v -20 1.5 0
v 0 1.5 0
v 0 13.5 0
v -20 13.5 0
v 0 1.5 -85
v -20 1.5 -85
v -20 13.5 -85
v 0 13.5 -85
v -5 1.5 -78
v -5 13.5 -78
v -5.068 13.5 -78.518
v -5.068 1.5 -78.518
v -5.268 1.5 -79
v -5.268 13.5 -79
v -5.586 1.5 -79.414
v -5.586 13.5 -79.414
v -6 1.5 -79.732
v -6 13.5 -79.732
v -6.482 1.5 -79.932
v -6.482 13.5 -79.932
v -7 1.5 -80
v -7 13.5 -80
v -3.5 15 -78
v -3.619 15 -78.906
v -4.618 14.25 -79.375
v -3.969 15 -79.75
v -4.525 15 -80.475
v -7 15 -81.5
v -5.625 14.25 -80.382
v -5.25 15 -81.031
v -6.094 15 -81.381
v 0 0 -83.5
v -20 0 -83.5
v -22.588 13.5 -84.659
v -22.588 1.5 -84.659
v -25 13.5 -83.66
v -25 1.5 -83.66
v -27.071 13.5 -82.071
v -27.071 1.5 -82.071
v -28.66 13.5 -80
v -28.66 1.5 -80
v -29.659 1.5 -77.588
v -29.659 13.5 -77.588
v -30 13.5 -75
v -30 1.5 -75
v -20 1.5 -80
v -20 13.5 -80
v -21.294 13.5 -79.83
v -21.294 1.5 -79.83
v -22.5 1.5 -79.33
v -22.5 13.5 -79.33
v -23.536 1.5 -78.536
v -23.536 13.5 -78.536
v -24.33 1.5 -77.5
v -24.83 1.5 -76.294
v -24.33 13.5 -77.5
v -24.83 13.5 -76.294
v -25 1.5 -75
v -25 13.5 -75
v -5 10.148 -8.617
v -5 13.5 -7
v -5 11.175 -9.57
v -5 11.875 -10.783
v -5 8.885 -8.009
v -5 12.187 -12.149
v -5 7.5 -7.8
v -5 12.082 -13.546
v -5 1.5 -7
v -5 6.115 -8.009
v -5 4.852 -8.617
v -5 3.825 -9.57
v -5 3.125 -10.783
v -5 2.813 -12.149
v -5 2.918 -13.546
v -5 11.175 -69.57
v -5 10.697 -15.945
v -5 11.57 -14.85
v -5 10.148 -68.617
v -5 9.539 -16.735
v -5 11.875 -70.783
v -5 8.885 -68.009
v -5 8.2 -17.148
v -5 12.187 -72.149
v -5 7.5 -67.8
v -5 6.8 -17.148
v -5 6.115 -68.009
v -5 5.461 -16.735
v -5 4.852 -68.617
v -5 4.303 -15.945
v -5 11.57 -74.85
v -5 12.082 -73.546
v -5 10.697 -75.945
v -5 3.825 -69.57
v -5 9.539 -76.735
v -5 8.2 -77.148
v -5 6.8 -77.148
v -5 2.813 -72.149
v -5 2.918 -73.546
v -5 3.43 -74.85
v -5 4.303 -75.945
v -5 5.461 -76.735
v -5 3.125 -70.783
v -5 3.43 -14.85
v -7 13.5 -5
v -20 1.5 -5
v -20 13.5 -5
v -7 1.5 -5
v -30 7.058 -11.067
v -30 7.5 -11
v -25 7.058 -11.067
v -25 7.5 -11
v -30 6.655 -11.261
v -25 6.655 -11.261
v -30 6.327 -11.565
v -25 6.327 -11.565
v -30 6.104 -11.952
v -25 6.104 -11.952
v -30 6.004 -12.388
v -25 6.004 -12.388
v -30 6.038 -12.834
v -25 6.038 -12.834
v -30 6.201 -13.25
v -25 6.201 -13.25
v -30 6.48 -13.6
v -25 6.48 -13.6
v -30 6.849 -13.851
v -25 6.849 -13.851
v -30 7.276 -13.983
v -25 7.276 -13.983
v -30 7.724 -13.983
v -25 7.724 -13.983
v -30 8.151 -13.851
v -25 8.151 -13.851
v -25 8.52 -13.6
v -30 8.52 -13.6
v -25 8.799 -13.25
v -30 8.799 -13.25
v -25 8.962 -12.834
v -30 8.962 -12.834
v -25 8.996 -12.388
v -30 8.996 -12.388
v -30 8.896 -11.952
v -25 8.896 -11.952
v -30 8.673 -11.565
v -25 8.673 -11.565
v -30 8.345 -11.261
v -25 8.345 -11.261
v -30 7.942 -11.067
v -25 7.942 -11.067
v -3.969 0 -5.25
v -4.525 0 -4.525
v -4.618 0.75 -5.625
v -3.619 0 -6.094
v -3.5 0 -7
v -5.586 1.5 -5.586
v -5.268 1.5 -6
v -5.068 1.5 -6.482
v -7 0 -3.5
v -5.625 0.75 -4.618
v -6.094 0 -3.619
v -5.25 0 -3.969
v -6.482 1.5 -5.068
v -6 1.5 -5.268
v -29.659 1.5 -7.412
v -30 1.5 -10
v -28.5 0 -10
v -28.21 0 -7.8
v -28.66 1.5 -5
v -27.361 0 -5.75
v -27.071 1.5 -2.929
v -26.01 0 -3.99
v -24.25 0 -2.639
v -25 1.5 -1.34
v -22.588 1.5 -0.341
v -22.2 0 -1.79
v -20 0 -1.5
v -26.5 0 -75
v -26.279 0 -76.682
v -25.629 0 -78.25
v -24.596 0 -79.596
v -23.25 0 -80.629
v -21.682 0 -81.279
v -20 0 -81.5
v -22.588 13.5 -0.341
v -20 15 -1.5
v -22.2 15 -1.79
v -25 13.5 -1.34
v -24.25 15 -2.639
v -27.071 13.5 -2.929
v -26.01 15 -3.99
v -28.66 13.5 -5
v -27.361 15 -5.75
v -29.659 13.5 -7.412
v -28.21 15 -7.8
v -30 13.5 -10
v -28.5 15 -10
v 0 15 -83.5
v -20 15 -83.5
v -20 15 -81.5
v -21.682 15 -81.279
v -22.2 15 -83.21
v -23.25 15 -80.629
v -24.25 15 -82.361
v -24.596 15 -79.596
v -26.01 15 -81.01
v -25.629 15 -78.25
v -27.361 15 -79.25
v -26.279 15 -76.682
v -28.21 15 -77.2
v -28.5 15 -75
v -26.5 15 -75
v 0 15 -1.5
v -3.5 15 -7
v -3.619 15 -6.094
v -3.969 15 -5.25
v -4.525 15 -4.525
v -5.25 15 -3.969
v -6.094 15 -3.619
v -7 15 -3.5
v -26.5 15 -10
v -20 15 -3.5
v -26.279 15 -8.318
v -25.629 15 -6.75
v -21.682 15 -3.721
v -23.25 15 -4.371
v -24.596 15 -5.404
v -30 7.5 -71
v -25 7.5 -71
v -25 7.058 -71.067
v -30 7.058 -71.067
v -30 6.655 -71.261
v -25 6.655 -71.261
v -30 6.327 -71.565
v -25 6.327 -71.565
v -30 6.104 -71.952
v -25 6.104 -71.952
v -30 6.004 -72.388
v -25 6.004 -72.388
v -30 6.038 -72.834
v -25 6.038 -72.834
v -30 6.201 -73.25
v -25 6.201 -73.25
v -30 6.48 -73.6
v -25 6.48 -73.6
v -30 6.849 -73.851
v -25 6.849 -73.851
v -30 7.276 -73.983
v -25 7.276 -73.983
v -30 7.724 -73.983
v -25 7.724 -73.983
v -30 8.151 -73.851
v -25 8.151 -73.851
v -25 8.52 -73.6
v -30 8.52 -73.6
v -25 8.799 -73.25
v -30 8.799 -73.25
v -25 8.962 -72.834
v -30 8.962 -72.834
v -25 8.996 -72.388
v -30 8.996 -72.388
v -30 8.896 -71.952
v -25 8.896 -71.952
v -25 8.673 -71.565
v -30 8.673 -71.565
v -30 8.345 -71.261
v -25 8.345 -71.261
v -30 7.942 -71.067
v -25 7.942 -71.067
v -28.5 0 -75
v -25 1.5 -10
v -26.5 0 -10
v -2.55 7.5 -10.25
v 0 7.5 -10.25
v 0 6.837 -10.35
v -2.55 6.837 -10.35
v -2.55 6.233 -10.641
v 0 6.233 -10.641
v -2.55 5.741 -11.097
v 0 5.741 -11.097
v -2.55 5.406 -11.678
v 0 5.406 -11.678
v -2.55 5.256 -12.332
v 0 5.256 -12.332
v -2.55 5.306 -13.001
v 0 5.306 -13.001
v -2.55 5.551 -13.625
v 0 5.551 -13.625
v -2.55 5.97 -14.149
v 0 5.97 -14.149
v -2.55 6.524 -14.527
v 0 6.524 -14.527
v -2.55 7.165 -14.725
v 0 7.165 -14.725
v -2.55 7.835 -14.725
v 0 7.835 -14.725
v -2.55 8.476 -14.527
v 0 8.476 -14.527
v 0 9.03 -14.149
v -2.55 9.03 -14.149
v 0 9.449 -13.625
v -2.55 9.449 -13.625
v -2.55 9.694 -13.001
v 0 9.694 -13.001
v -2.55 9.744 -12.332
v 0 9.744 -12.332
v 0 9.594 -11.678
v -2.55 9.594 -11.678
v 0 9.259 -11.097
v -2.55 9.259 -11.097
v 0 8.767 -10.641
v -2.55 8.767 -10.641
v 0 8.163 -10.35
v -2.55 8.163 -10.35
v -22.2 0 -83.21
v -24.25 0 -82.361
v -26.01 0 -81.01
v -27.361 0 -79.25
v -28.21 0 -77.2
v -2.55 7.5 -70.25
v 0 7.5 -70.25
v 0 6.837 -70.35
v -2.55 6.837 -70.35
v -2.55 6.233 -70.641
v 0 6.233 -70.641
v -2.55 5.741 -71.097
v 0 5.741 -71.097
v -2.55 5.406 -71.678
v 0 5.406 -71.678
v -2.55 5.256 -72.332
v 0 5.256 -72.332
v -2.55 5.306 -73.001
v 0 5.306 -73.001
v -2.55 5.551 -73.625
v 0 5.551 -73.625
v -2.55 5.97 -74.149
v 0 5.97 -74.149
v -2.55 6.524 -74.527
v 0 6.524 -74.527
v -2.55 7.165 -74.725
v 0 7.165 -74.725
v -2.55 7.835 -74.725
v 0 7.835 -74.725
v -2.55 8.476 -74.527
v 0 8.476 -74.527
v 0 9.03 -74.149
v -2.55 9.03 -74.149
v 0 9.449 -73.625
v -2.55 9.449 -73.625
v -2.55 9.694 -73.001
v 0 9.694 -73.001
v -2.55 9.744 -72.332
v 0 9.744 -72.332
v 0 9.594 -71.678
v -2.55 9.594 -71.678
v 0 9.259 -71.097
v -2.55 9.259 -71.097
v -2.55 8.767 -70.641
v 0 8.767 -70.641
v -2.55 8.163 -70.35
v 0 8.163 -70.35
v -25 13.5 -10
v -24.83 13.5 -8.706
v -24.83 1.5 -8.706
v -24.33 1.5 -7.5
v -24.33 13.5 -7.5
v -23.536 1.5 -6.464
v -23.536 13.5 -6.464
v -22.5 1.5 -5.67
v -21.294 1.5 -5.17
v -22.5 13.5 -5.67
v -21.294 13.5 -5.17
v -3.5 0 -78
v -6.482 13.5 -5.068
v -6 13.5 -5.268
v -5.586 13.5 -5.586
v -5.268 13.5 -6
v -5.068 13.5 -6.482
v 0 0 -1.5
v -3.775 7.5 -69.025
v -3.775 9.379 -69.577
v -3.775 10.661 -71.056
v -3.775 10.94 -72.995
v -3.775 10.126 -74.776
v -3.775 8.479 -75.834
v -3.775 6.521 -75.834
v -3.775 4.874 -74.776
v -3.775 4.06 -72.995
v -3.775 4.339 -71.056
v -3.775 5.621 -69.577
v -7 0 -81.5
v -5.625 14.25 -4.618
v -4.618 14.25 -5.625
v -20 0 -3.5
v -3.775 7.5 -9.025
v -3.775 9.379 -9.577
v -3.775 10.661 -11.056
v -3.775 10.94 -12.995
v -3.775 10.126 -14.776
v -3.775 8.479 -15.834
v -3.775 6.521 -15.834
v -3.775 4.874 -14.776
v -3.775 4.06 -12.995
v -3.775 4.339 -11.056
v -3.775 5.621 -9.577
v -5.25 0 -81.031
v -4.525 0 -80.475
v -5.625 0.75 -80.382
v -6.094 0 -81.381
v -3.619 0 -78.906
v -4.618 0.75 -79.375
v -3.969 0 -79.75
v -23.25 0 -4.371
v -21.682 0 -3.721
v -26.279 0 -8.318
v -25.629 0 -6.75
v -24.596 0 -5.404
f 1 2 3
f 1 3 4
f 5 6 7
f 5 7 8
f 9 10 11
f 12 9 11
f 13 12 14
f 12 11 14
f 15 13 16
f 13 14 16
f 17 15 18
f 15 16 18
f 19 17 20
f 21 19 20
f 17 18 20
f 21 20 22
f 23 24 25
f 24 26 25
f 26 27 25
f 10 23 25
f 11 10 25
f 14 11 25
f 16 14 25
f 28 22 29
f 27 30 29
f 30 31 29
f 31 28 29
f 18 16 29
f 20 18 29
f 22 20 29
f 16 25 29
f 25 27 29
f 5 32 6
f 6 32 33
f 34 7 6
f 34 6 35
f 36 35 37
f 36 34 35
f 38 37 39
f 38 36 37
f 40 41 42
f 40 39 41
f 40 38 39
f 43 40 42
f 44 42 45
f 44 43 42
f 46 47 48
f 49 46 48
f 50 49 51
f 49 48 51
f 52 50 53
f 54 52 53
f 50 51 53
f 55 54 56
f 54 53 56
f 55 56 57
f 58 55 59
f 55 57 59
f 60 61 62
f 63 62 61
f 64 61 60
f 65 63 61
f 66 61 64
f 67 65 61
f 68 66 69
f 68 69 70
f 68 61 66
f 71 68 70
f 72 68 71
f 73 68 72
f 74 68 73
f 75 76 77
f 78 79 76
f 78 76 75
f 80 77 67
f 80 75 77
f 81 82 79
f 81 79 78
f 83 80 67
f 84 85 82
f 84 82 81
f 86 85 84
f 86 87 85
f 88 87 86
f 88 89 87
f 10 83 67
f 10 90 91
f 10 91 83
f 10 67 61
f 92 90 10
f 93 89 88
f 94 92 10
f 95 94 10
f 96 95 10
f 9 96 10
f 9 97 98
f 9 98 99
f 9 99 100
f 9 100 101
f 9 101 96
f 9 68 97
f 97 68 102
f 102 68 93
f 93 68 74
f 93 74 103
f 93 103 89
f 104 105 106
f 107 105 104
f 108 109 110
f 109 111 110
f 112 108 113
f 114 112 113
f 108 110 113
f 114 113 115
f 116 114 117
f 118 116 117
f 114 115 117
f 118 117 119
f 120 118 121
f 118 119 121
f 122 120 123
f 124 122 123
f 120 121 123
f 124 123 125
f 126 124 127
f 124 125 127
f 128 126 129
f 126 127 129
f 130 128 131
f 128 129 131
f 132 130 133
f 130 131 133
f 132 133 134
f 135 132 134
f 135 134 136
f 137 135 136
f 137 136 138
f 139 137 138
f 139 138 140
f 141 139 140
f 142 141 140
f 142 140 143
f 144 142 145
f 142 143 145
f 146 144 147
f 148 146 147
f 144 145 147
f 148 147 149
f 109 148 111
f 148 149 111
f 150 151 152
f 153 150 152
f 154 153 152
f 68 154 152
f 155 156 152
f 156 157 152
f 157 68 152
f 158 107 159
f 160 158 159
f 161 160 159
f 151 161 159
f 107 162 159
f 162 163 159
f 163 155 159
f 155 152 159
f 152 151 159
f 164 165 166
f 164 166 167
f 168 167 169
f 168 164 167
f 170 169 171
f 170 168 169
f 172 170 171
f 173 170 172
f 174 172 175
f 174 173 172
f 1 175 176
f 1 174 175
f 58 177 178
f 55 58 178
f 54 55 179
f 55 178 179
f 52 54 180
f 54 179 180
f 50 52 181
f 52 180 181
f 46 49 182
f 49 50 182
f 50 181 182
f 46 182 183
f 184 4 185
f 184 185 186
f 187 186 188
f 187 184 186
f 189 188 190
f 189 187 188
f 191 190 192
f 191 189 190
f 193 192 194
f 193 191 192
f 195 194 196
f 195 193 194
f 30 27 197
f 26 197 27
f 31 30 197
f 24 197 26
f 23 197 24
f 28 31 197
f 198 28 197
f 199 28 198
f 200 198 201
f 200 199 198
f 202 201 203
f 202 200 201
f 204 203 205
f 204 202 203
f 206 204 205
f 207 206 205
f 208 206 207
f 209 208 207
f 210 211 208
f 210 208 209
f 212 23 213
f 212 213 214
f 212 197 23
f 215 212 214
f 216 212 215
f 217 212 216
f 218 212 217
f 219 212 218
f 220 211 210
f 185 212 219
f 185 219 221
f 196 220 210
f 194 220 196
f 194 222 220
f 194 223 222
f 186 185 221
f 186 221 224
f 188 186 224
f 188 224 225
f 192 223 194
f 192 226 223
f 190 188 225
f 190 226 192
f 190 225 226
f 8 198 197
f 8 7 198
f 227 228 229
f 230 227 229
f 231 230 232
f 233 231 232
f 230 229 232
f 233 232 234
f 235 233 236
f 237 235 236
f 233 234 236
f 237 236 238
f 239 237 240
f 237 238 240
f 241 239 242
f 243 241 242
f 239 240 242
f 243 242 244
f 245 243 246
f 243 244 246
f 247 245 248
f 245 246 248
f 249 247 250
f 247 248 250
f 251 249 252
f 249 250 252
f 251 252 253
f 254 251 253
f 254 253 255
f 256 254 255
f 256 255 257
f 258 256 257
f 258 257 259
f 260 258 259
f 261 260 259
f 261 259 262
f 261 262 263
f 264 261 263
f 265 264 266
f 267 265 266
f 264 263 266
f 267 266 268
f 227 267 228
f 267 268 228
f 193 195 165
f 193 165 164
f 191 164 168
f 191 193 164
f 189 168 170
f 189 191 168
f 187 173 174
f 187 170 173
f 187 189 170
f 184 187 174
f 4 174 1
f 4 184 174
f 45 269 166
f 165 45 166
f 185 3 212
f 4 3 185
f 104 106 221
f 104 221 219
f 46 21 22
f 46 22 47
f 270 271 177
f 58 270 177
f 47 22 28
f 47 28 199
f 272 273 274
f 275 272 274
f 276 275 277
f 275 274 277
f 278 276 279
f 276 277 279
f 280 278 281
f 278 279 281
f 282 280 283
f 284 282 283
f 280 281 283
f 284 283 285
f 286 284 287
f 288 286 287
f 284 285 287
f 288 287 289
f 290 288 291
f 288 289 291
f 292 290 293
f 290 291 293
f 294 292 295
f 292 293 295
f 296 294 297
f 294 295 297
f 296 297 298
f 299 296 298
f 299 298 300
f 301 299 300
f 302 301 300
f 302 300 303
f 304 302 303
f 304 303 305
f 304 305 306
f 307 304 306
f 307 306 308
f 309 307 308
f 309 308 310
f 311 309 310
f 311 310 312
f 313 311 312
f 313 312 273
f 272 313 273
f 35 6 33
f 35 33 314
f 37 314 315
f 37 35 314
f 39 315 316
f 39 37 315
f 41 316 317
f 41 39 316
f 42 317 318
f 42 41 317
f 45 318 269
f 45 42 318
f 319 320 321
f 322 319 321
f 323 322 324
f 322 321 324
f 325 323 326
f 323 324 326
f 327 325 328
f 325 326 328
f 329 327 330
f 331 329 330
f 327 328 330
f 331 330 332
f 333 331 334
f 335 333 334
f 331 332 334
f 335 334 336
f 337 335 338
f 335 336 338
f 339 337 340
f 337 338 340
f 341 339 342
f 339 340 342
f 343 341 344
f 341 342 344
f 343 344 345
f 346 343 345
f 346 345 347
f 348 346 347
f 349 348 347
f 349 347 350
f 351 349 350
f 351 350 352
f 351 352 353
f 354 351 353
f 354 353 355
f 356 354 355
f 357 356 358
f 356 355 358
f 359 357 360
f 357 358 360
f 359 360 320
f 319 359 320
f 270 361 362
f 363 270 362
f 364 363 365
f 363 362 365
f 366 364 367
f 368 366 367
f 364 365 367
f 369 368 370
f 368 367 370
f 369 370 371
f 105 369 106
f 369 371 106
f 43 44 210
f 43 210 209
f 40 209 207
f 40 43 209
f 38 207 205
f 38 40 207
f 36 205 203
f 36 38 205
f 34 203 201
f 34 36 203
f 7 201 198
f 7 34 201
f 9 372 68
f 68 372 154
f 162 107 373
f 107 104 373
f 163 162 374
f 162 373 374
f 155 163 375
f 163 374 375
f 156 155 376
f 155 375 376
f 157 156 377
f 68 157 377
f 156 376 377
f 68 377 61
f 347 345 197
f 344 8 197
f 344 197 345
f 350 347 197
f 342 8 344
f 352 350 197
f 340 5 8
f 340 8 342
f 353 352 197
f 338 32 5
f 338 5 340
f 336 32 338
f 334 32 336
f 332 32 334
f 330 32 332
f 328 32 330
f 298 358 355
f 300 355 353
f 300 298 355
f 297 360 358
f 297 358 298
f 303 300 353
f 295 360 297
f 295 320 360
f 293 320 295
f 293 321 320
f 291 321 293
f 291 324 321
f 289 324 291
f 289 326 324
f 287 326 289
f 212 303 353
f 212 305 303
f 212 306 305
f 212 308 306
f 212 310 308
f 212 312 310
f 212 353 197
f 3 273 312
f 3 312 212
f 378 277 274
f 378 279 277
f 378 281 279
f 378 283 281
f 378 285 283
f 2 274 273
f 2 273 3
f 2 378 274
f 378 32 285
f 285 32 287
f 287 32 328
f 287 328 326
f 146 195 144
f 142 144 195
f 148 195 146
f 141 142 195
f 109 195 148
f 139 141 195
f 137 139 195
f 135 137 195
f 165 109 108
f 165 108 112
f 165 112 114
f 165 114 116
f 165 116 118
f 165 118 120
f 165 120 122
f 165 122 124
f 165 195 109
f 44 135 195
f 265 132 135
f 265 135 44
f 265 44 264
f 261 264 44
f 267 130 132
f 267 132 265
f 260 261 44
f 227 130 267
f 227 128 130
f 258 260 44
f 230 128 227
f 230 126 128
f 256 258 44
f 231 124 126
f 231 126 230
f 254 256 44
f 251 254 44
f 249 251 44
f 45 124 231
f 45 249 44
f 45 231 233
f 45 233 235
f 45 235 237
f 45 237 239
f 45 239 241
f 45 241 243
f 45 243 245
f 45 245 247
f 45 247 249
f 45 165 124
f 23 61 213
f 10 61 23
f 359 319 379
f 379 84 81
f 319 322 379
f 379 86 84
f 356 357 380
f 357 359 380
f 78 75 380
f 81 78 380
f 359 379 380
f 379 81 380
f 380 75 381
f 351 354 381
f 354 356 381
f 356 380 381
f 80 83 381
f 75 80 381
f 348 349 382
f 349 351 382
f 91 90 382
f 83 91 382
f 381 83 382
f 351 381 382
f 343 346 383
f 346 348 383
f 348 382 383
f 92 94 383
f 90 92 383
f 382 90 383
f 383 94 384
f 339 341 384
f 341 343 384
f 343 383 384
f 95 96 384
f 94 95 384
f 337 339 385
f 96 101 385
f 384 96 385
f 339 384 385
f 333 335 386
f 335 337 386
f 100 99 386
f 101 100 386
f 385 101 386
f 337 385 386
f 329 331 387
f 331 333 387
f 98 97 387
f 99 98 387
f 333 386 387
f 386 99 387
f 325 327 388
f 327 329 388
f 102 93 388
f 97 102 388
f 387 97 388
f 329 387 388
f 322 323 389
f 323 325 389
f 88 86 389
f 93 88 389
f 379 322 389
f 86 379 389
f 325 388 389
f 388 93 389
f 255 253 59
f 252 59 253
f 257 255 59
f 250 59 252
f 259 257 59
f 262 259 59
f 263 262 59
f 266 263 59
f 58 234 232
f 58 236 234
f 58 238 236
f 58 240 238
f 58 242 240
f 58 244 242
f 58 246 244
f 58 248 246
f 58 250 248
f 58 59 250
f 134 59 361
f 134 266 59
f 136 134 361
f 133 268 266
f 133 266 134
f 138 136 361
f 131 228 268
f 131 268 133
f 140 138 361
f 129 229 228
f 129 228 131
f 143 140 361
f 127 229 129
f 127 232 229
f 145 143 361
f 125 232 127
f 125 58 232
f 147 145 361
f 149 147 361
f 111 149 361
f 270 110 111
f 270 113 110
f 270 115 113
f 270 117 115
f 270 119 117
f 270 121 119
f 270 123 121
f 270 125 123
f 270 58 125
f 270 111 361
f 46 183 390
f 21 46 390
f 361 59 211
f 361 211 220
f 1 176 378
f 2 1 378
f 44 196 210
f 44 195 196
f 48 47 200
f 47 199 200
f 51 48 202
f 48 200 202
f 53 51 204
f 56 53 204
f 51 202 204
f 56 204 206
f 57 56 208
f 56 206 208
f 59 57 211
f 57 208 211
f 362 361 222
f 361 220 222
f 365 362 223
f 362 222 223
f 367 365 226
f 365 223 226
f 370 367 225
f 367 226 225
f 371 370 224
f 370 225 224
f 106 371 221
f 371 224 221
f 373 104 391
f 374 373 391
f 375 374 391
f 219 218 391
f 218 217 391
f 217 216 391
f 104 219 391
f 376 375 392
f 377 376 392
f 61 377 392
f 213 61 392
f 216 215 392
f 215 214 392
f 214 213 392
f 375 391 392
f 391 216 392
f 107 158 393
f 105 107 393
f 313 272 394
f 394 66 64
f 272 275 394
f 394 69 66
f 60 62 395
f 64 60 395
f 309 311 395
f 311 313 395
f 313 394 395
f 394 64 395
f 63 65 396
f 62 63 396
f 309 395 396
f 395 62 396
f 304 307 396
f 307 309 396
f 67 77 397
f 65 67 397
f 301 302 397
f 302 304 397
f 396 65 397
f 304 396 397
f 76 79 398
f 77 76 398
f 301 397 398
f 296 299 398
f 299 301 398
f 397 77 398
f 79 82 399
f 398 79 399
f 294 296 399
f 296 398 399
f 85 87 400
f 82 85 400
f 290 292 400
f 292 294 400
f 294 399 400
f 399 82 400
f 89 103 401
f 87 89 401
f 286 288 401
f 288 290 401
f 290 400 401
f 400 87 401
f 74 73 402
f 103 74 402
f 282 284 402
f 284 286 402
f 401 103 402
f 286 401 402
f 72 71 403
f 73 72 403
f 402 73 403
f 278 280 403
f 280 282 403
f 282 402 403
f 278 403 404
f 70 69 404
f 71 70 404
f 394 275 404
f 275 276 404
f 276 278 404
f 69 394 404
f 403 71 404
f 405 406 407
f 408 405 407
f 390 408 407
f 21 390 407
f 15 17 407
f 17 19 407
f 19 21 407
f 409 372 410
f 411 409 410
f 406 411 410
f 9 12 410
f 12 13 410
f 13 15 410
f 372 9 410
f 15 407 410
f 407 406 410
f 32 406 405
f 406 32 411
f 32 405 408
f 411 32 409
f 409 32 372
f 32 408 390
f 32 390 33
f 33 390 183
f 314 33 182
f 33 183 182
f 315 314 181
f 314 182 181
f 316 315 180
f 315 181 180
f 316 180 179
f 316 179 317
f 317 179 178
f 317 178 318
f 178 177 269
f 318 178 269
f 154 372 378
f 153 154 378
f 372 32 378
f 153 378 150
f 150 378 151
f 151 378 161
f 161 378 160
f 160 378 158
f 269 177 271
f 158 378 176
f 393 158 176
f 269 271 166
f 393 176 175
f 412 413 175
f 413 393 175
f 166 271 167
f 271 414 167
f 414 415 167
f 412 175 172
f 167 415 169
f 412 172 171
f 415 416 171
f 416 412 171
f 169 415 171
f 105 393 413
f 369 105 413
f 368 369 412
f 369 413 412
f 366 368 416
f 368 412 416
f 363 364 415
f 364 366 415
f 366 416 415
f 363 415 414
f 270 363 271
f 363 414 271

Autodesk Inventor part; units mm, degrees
ref_plane "YZ Plane" through (0, 0, 0) normal (1, 0, 0) x (0, 1, 0)
ref_plane "XZ Plane" through (0, 0, 0) normal (0, 1, 0) x (-1, 0, 0)
ref_plane "XY Plane" through (0, 0, 0) normal (0, 0, 1) x (1, 0, 0)
sketch "Skizze1" plane through (0, 0, 0) normal (0, 1, 0) x (-1, 0, 0)
  line L0 (0, 0) -> (5, 0)
  line L1 (5, 0) -> (5, -85)
  line L2 (5, -85) -> (0, -85)
  line L3 (0, -85) -> (0, 0)
  line L4 (0, 0) -> (25, 0)
  line L5 (25, 0) -> (25, -5)
  line L6 (25, -5) -> (0, -5)
  line L7 (0, -5) -> (0, 0)
  line L8 (25, 0) -> (30, 0)
  line L9 (30, 0) -> (30, -85)
  line L10 (30, -85) -> (25, -85)
  line L11 (25, -85) -> (25, 0)
  line L12 (30, -85) -> (0, -85)
  line L13 (0, -85) -> (0, -80)
  line L14 (0, -80) -> (30, -80)
  line L15 (30, -80) -> (30, -85)
  point P0 (5, -5)
  point P1 (25, -80)
  point P2 (5, -80)
  dimension "d0" = 5
  dimension "d1" = 85
  dimension "d2" = 25
  dimension "d3" = 5
  dimension "d4" = 5
  dimension "d5" = 85
  dimension "d13" = 30
  dimension "d14" = 5
extrude "Extrusion1" add sketch "Skizze1" along normal blind 15 contours L0 L1 L6 L3 | L4 L5 L6 L1 | L6 L1 L14 L3 | L8 L9 L14 L11 L5 | L14 L1 L2 L3 | L14 L11 L12 L1 | L14 L9 L10 L11
fillet "Rundung1" radius 10 2 edges at (-30, 7.5, 0) (-30, 7.5, -85)
fillet "Rundung2" radius 5 2 edges at (-25, 7.5, -5) (-25, 7.5, -80)
fillet "Rundung3" radius 2 2 edges at (-5, 7.5, -5) (-5, 7.5, -80)
sketch "Skizze2" plane through (-5, 0, -75) normal (-1, 0, 0) x (0, 0, 1)
  line L0 (-10, 0) -> (-10, 15) projected
  line L1 (-10, 7.5) -> (75, 7.5) construction
  line L2 (75, 0) -> (75, 15) construction
  point P0 (62.5, 7.5)
  point P1 (2.5, 7.5)
  dimension "d15" = 60
  dimension "d16" = 12.5
hole "Bohrung1" at (-5, 7.5, -12.5) at (-5, 7.5, -72.5) direction (1, 0, 0) diameter 4.5 depth 5 countersink diameter 9.4 countersink angle 90 clearance for "Flachkopfsenkschraube ISO 2009/7046" size "M4" standard "ISO"
sketch "Skizze3" plane through (-30, 0, -75) normal (-1, 0, 0) x (0, 0, 1)
  circle A0 centre (2.5, 7.5) radius 4.7 projected
  circle A1 centre (62.5, 7.5) radius 4.7 projected
  circle A2 centre (2.5, 7.5) radius 2.25 projected
  point P0 (75, 0)
hole "Bohrung2" at (-30, 7.5, -72.5) at (-30, 7.5, -12.5) direction (1, 0, 0) diameter 3 depth 25
chamfer "Fasen1" distance 1.5 angle 45 8 edges at (-5, 0, -42.5) (-13.5, 0, -5) (-25, 0, -42.5) (-13.5, 0, -80) (-5, 15, -42.5) (-13.5, 15, -5) (-25, 15, -42.5) (-13.5, 15, -80)
chamfer "Fasen2" distance 1.5 angle 45 10 edges at (-30, 0, -42.5) (-27.0711, 0, -2.9289) (-10, 0, 0) (-27.0711, 0, -82.0711) (-10, 0, -85) (-30, 15, -42.5) (-27.0711, 15, -2.9289) (-10, 15, 0) (-27.0711, 15, -82.0711) (-10, 15, -85)
properties part number "260_Handle"
